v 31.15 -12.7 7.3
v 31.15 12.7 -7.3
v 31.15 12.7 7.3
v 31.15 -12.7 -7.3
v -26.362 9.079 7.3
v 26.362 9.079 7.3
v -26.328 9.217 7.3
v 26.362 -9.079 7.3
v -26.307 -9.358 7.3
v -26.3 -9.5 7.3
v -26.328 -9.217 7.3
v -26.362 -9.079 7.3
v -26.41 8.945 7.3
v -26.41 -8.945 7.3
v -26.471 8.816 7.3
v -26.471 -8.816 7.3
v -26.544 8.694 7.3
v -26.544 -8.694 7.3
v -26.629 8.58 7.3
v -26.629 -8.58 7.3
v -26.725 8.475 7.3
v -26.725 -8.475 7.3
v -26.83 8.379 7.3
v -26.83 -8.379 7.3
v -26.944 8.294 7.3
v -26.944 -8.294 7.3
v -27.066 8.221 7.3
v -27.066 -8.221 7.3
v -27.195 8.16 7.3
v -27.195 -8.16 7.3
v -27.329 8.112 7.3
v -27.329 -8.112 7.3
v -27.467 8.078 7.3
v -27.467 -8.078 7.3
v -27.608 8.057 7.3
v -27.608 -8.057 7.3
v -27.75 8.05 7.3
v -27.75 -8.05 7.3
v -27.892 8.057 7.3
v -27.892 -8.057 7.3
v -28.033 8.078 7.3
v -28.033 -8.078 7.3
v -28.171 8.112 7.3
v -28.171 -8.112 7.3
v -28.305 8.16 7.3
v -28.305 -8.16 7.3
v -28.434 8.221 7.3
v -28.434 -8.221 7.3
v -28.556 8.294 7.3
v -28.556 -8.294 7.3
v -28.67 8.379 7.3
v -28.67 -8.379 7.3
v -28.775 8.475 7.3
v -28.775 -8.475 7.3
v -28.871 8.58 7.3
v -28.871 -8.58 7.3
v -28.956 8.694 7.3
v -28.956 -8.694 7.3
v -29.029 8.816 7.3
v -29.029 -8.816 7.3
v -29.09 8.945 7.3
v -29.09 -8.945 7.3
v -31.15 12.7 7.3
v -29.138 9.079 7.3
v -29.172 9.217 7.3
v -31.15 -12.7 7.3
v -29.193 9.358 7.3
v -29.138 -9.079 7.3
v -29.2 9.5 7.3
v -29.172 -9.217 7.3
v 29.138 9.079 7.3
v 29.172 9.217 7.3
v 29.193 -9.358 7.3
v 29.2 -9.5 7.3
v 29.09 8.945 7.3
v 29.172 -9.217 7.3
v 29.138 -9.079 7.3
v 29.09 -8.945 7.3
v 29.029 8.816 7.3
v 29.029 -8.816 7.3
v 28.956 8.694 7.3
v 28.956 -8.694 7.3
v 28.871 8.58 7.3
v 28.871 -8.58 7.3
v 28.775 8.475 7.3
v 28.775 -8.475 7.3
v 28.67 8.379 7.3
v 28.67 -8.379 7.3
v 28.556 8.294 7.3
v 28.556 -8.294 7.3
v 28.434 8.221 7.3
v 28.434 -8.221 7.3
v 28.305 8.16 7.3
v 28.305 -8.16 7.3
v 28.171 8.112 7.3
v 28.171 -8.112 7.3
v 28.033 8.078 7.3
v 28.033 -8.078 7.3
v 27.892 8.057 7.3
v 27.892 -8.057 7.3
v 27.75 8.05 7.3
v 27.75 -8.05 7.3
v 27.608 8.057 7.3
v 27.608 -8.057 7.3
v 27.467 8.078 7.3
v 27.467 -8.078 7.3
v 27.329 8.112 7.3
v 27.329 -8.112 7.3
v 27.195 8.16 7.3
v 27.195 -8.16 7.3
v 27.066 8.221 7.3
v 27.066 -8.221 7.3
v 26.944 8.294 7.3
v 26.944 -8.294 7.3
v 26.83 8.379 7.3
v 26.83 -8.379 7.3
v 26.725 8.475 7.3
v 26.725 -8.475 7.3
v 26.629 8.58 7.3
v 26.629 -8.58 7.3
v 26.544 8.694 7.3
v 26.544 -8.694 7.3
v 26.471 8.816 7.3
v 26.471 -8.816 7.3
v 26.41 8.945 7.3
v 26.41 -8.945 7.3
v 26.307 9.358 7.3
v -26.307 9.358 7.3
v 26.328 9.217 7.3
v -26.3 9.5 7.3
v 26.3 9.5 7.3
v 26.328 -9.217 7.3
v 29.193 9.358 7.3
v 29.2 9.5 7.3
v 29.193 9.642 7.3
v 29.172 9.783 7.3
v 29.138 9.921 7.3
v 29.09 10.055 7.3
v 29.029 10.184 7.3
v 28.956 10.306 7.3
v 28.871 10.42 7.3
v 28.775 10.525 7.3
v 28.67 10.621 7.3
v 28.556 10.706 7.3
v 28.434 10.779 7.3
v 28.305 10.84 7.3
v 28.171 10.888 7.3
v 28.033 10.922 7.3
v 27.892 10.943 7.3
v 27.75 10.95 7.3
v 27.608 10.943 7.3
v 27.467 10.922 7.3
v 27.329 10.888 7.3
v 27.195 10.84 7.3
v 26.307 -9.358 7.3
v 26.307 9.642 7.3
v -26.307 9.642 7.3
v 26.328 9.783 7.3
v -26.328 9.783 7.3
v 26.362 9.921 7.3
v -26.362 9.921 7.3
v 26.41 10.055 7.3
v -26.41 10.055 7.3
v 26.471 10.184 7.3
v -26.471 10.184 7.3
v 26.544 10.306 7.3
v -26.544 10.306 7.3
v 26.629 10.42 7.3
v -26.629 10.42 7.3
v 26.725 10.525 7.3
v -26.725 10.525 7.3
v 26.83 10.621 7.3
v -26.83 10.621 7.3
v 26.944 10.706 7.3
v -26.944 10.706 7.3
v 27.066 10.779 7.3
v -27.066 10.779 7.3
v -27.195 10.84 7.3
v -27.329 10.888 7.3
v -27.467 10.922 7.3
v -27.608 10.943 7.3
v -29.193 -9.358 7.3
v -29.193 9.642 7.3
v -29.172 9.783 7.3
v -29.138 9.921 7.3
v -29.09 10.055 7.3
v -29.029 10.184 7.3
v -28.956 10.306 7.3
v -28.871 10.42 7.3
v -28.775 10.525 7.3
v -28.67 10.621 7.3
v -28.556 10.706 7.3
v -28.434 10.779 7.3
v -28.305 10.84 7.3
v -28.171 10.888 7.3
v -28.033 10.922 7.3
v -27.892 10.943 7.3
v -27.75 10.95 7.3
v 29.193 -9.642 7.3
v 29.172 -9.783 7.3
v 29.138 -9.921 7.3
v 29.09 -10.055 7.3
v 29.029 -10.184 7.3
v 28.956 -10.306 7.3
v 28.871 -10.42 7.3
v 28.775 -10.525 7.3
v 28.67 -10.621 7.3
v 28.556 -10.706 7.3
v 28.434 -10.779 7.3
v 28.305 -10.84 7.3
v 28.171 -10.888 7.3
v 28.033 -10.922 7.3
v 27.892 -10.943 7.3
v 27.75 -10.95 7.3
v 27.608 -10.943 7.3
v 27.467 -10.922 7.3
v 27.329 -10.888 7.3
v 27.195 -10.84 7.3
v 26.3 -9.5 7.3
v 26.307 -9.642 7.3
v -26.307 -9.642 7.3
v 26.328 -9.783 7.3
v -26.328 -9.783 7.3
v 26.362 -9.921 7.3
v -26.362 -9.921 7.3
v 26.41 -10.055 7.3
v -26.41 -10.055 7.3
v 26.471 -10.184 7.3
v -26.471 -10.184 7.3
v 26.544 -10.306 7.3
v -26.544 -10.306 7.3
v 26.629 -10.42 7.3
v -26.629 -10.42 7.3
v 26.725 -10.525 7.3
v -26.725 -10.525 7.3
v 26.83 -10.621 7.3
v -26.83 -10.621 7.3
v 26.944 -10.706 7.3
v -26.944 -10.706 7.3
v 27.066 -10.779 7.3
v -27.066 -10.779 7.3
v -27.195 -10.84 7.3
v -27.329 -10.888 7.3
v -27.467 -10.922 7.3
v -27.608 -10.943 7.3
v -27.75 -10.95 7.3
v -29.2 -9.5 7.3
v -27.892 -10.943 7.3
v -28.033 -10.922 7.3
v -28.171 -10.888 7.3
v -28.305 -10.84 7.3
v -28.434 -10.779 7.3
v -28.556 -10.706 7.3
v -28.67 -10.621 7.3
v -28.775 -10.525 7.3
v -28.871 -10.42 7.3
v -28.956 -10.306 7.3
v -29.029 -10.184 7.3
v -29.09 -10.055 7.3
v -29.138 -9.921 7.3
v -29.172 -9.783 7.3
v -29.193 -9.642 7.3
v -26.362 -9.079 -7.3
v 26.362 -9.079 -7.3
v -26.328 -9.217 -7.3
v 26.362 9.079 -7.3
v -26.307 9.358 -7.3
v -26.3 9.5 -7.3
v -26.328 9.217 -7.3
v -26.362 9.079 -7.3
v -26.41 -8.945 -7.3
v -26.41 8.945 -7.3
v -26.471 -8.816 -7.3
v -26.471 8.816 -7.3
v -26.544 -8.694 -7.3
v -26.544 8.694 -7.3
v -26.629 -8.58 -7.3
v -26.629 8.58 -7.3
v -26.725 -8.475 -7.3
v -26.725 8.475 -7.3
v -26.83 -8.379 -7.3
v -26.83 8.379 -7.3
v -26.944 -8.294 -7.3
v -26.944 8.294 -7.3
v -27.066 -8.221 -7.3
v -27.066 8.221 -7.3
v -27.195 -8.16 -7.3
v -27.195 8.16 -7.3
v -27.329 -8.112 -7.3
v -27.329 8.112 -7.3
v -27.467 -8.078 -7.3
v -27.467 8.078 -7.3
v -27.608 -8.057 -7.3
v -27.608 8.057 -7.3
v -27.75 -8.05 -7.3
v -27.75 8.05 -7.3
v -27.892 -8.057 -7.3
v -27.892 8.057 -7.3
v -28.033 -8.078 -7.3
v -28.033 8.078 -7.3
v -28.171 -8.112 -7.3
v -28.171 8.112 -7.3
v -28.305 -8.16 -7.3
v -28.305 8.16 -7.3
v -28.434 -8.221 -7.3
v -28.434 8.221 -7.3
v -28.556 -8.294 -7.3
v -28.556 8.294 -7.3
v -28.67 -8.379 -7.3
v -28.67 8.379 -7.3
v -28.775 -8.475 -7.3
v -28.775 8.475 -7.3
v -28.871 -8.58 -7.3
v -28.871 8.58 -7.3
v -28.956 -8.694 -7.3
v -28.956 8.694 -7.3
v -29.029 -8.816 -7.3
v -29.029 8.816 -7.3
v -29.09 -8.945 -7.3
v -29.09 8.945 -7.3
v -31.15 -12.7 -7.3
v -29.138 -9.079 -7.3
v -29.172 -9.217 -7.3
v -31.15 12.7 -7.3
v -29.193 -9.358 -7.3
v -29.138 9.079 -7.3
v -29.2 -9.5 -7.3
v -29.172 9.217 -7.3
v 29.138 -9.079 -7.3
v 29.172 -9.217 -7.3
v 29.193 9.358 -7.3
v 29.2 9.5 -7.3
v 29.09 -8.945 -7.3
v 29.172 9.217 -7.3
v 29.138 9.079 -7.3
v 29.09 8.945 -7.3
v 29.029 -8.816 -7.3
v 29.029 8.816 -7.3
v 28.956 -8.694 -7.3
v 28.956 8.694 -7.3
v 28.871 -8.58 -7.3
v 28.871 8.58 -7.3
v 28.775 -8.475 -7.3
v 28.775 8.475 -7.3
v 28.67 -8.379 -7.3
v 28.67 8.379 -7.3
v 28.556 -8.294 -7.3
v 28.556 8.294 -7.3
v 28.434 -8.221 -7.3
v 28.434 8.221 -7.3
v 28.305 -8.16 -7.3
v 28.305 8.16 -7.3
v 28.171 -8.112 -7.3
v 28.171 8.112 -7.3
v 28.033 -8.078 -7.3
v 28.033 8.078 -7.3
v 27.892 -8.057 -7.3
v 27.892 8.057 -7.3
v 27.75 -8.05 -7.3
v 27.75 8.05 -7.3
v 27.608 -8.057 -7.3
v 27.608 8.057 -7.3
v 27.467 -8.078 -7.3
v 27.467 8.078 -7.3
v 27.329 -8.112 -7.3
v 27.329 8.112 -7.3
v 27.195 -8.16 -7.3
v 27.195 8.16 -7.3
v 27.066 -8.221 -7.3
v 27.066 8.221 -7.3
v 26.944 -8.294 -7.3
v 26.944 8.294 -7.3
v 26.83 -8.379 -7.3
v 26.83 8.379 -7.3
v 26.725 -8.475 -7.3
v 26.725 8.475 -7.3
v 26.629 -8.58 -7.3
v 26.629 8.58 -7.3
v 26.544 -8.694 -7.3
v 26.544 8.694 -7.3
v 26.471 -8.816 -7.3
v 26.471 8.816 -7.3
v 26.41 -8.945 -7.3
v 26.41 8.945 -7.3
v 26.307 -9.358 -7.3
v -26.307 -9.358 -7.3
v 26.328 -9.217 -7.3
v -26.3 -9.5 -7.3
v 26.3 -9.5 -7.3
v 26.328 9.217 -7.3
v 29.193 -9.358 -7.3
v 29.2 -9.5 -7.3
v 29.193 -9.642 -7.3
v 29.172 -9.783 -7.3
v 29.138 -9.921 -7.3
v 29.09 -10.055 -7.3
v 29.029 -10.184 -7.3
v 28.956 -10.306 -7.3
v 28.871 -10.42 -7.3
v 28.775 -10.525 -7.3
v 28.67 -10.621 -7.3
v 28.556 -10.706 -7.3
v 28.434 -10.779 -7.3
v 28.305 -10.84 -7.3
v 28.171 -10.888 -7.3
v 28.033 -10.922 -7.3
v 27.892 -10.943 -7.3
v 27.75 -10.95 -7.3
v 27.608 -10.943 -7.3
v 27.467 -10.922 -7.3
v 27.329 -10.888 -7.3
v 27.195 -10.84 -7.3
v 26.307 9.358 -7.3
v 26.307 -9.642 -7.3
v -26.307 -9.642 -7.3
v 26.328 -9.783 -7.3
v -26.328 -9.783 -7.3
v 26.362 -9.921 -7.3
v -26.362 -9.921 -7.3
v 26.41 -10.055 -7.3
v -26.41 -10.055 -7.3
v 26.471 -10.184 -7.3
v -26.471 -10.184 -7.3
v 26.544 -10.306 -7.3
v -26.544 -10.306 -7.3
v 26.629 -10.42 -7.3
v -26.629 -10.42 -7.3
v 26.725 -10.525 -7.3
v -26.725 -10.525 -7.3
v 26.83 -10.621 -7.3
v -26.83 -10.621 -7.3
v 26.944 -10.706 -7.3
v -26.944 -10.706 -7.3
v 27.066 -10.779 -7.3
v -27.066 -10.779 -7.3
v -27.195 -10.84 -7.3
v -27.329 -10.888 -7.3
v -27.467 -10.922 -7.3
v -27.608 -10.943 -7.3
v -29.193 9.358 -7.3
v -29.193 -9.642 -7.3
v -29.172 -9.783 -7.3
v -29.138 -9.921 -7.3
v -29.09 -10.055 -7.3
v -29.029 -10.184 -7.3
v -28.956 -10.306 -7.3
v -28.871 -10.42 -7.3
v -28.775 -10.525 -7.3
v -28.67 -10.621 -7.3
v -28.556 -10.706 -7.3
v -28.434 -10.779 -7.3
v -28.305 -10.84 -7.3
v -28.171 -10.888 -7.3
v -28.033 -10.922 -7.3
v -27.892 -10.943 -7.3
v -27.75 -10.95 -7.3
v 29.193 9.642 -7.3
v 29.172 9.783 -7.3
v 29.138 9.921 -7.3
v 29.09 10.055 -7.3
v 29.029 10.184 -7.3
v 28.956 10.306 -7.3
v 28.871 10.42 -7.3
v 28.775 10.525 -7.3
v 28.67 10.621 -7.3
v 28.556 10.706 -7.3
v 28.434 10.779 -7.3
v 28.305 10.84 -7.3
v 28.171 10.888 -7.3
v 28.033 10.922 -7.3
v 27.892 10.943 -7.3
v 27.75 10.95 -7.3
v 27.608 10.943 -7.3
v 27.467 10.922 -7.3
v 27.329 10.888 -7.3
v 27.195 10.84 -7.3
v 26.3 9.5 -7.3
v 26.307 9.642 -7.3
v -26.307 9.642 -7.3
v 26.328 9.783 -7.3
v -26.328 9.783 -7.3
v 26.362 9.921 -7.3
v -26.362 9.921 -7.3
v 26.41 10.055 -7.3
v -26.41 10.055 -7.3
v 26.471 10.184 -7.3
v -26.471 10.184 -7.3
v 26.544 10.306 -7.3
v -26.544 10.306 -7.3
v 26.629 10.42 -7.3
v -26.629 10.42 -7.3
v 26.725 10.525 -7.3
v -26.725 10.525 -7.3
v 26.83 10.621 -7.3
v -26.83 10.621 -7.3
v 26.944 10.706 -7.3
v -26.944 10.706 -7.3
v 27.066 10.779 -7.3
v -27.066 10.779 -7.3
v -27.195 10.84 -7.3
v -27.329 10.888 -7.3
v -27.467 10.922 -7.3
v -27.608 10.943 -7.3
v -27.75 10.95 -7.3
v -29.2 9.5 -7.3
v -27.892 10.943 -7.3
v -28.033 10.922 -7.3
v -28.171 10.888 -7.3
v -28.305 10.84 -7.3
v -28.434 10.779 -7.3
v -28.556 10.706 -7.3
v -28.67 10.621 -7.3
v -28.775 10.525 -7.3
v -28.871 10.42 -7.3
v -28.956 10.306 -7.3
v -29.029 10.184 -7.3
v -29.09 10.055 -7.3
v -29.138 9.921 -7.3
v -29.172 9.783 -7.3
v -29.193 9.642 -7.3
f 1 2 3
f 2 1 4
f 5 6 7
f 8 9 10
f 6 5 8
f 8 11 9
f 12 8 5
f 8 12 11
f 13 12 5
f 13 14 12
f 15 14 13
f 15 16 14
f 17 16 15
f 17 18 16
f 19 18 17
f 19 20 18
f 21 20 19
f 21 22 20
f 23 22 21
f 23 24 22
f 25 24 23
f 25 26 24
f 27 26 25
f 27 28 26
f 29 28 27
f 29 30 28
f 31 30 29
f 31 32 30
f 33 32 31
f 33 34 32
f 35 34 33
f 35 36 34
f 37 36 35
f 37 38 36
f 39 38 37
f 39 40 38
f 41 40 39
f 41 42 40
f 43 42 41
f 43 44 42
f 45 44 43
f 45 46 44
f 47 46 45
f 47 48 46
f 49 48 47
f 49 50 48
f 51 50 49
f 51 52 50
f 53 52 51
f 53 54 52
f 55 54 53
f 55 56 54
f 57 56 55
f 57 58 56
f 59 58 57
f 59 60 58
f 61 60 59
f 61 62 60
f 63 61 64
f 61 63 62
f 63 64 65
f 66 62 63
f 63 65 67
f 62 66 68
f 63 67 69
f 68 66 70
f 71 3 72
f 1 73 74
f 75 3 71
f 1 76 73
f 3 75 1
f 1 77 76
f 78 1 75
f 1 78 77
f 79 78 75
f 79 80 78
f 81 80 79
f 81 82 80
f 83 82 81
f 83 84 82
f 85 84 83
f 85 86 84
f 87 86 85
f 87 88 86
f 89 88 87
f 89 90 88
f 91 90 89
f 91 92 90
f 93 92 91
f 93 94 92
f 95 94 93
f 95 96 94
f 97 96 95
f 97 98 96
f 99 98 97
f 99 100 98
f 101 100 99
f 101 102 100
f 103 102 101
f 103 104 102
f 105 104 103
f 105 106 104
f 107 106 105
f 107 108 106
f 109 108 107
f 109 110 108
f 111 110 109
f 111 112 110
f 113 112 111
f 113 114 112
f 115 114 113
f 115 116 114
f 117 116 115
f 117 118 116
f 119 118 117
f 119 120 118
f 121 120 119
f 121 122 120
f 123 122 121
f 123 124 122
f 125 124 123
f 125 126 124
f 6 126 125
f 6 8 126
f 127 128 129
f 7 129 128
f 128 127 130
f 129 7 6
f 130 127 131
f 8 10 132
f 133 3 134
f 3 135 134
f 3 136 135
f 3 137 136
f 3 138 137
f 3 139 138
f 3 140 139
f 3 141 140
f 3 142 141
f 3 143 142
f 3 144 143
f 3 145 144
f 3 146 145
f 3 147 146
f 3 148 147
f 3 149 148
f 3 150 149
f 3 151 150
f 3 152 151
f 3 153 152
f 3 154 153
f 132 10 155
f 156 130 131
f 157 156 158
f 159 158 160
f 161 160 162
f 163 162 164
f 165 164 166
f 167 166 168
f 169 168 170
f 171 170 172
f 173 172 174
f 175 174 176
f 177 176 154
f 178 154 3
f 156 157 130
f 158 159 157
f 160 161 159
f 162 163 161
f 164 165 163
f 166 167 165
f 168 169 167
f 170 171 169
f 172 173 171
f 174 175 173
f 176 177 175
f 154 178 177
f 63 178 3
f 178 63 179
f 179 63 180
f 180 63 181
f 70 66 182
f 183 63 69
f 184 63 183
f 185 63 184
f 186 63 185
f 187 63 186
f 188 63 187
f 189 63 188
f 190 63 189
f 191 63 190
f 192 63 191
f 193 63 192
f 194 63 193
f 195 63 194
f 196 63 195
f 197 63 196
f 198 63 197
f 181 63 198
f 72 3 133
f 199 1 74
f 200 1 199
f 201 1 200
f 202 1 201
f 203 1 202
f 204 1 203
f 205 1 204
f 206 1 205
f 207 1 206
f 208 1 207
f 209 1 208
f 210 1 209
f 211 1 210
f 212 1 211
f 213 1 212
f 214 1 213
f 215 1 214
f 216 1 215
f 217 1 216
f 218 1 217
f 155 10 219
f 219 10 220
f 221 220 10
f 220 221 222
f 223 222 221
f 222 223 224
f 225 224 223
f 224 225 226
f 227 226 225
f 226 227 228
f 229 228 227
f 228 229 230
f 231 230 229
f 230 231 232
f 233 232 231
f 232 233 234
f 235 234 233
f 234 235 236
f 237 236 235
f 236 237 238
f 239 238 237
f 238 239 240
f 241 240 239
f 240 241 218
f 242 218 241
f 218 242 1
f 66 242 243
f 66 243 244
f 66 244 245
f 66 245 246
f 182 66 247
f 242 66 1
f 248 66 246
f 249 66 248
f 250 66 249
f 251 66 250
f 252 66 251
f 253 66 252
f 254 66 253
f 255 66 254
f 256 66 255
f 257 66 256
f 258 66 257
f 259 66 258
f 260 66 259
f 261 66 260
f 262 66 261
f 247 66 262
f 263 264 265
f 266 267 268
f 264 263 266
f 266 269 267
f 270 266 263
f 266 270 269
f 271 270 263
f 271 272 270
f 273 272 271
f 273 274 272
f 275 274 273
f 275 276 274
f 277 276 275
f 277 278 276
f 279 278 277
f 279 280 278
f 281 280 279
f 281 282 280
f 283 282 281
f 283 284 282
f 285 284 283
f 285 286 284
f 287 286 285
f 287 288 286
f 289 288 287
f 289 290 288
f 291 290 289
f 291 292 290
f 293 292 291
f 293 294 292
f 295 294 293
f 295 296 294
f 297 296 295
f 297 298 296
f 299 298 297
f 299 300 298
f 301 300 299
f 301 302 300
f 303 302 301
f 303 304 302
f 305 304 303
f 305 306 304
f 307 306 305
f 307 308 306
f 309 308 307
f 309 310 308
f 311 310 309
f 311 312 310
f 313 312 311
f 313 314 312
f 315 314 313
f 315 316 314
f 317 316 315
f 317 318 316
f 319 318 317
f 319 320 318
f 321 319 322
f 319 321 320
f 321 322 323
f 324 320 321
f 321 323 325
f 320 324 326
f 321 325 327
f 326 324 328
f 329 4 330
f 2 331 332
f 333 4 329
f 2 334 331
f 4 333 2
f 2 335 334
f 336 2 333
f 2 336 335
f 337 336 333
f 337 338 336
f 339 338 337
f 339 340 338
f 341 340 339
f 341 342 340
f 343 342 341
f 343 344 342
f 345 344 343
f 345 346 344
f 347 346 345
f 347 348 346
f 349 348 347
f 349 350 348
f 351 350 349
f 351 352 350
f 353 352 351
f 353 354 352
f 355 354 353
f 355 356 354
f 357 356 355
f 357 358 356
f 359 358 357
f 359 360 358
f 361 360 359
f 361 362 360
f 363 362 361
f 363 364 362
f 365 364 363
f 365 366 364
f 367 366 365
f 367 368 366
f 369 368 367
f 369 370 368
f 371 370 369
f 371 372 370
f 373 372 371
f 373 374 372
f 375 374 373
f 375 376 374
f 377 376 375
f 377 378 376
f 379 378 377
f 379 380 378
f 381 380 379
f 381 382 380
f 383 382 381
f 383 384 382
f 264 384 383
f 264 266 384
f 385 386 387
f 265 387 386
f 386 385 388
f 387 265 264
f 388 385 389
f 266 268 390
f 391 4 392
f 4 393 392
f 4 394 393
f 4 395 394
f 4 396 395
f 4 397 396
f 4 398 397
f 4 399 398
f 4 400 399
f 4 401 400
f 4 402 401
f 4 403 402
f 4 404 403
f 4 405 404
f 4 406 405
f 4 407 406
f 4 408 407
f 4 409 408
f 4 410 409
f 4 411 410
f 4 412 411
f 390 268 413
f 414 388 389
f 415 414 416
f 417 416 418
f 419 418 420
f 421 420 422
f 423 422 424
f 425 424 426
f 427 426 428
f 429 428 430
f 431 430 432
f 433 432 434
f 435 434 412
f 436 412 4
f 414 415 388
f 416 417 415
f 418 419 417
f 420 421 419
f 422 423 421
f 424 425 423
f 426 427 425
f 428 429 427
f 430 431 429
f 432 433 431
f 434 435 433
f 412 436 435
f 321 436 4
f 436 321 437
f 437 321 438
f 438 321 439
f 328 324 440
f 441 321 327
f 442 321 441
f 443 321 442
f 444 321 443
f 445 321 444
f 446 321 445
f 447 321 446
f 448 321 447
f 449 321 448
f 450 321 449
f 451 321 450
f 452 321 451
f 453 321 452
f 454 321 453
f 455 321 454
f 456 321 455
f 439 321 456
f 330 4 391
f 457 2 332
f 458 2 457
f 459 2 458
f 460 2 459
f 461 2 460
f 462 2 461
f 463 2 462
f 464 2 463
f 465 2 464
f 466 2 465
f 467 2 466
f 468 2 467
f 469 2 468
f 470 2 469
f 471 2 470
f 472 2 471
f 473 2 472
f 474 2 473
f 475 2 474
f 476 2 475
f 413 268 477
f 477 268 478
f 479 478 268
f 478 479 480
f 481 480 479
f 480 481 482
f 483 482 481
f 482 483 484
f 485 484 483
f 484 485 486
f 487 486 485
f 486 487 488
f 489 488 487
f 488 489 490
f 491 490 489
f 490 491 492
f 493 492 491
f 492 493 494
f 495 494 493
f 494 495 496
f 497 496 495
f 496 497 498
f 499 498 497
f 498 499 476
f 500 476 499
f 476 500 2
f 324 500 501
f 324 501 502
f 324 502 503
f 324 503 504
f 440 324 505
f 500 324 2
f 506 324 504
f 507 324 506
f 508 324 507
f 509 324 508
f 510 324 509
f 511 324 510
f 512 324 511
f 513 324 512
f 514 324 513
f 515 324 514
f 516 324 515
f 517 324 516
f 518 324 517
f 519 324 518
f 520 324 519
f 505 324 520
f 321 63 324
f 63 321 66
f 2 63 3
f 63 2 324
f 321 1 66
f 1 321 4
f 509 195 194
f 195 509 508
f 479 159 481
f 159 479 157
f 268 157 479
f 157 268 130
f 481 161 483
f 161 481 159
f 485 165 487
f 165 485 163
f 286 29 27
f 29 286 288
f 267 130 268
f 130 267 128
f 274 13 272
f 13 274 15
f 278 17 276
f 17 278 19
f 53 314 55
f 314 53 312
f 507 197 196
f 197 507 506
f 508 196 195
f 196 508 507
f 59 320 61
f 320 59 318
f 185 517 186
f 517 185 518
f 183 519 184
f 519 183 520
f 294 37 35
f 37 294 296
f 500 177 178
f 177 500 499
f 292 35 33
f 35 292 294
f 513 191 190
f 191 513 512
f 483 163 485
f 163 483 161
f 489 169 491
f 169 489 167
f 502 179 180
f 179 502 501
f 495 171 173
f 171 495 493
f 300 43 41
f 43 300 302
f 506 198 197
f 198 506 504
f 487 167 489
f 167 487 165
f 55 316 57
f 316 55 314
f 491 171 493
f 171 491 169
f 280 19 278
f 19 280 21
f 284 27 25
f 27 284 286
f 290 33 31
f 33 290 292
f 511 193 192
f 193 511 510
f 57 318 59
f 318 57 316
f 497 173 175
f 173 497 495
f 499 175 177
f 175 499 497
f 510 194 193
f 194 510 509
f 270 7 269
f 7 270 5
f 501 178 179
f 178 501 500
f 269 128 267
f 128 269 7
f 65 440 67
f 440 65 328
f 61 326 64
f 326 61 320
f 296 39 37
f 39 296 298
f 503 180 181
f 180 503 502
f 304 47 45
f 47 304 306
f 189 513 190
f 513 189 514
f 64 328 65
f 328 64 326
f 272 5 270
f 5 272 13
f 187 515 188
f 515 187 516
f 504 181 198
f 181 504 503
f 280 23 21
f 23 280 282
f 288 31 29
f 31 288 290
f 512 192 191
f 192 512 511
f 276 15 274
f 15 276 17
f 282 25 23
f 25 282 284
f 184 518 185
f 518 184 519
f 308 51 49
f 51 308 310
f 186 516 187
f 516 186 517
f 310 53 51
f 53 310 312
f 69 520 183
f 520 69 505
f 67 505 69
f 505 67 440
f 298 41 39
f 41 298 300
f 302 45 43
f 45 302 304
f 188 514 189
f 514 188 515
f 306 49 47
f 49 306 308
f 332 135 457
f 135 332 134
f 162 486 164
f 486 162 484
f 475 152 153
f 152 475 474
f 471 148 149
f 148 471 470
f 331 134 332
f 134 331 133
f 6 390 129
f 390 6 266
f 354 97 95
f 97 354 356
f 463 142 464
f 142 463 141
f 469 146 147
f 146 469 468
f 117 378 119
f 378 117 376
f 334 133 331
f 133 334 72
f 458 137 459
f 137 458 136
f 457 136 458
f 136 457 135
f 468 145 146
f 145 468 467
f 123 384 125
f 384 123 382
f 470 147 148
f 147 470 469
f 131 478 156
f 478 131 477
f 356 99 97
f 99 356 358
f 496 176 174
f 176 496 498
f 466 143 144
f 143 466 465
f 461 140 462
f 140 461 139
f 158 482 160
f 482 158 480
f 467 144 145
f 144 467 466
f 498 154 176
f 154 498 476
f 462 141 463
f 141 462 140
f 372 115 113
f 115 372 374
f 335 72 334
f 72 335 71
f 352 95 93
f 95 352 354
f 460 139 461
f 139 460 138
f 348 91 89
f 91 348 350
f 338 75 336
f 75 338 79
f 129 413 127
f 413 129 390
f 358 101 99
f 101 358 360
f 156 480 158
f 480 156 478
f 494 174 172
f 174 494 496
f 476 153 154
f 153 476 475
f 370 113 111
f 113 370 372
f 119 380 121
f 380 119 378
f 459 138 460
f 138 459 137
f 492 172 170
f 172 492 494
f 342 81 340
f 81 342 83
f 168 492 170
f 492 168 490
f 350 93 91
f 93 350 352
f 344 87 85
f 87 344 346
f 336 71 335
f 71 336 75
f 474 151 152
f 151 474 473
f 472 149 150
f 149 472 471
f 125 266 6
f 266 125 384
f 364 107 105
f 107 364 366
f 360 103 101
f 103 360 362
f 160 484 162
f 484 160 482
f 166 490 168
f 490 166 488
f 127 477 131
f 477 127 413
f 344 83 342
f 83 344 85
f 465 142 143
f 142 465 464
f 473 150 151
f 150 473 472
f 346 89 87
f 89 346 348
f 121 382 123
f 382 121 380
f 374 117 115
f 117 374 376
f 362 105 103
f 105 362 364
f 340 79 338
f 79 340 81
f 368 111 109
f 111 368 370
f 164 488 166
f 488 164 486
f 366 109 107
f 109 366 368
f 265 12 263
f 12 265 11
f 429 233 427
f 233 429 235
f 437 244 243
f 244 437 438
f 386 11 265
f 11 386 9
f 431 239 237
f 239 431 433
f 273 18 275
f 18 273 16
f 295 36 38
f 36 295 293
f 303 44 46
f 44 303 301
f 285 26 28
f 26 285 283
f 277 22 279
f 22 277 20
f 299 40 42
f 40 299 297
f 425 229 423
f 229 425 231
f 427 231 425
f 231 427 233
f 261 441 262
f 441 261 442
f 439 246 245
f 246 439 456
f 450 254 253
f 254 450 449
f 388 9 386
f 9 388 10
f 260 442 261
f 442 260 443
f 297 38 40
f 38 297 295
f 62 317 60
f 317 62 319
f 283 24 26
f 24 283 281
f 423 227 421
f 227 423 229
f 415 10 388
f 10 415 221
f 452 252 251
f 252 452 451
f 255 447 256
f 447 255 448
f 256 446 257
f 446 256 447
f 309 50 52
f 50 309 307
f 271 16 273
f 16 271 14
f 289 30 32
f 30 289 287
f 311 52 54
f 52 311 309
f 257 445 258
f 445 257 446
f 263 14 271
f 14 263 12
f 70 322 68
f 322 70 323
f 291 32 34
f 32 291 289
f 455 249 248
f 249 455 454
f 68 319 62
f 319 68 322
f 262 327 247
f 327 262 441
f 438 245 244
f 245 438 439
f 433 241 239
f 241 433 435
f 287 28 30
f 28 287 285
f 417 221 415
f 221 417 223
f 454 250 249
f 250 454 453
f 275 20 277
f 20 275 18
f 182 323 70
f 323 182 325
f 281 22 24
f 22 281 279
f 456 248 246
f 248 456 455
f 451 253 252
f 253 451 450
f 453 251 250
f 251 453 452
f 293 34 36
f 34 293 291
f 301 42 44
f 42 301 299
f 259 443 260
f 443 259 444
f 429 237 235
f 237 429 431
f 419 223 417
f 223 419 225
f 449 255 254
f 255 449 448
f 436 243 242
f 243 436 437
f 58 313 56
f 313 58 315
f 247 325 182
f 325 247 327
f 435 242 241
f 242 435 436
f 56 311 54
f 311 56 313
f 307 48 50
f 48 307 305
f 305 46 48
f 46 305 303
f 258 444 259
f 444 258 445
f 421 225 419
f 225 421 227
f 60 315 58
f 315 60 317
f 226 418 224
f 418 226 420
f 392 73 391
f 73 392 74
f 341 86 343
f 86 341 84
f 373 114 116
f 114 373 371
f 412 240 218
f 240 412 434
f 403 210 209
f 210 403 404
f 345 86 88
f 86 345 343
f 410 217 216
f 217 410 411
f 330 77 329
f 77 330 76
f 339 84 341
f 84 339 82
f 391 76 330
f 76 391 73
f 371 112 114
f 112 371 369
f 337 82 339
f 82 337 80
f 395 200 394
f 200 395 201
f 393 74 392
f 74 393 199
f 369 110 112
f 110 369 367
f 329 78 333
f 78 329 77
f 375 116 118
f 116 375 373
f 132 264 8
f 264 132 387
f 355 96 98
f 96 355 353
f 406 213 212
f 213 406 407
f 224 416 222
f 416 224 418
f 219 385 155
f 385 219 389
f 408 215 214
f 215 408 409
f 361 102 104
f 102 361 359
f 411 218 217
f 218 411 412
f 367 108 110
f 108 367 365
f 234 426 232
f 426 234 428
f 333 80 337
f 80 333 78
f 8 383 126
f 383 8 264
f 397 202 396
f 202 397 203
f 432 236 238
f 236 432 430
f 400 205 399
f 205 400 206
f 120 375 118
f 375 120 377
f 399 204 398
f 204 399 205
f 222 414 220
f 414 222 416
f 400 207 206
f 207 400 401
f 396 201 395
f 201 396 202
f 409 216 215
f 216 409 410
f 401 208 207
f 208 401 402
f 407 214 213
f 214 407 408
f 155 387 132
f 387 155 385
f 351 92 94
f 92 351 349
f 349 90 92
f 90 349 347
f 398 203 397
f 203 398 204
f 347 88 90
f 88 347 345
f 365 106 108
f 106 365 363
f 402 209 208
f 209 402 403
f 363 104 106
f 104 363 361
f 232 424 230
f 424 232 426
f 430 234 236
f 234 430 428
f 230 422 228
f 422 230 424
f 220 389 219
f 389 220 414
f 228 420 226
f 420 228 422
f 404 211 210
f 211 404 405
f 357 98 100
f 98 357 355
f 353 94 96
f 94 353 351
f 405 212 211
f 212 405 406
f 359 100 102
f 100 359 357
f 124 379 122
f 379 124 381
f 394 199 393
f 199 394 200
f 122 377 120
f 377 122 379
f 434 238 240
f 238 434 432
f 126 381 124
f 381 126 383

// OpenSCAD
$fn = 64;
PWM_WIDTH = 62.3;
PWM_DEPTH = 25.4;
PWM_HEIGHT = 14.6;
PWM_HOLE_DIAM = 2.9;
PWM_HOLE_X_DIST = 55.5;
PWM_HOLE_Y_DIST = 19.0;
PWM_MOUNT_HEIGHT = 4;
PWM_SCREW_DIAM = PWM_HOLE_DIAM * 0.9;

module pwm(){
  difference(){
    /* Body */
    union(){
      cube([PWM_WIDTH, PWM_DEPTH, PWM_HEIGHT], true);
    }
    /* Top left screw hole */
    translate([-PWM_HOLE_X_DIST / 2, PWM_HOLE_Y_DIST / 2, 0]){
      cylinder(PWM_DEPTH * 2, PWM_HOLE_DIAM / 2, PWM_HOLE_DIAM / 2, true);
    }
    /* Top right screw hole */
    translate([PWM_HOLE_X_DIST / 2, PWM_HOLE_Y_DIST / 2, 0]){
      cylinder(PWM_DEPTH * 2, PWM_HOLE_DIAM / 2, PWM_HOLE_DIAM / 2, true);
    }
    /* Bottom left screw hole */
    translate([-PWM_HOLE_X_DIST / 2, -PWM_HOLE_Y_DIST / 2, 0]){
      cylinder(PWM_DEPTH * 2, PWM_HOLE_DIAM / 2, PWM_HOLE_DIAM / 2, true);
    }
    /* Bottom right screw hole */
    translate([PWM_HOLE_X_DIST / 2, -PWM_HOLE_Y_DIST / 2, 0]){
      cylinder(PWM_DEPTH * 2, PWM_HOLE_DIAM / 2, PWM_HOLE_DIAM / 2, true);
    }
  }
}

pwm();
